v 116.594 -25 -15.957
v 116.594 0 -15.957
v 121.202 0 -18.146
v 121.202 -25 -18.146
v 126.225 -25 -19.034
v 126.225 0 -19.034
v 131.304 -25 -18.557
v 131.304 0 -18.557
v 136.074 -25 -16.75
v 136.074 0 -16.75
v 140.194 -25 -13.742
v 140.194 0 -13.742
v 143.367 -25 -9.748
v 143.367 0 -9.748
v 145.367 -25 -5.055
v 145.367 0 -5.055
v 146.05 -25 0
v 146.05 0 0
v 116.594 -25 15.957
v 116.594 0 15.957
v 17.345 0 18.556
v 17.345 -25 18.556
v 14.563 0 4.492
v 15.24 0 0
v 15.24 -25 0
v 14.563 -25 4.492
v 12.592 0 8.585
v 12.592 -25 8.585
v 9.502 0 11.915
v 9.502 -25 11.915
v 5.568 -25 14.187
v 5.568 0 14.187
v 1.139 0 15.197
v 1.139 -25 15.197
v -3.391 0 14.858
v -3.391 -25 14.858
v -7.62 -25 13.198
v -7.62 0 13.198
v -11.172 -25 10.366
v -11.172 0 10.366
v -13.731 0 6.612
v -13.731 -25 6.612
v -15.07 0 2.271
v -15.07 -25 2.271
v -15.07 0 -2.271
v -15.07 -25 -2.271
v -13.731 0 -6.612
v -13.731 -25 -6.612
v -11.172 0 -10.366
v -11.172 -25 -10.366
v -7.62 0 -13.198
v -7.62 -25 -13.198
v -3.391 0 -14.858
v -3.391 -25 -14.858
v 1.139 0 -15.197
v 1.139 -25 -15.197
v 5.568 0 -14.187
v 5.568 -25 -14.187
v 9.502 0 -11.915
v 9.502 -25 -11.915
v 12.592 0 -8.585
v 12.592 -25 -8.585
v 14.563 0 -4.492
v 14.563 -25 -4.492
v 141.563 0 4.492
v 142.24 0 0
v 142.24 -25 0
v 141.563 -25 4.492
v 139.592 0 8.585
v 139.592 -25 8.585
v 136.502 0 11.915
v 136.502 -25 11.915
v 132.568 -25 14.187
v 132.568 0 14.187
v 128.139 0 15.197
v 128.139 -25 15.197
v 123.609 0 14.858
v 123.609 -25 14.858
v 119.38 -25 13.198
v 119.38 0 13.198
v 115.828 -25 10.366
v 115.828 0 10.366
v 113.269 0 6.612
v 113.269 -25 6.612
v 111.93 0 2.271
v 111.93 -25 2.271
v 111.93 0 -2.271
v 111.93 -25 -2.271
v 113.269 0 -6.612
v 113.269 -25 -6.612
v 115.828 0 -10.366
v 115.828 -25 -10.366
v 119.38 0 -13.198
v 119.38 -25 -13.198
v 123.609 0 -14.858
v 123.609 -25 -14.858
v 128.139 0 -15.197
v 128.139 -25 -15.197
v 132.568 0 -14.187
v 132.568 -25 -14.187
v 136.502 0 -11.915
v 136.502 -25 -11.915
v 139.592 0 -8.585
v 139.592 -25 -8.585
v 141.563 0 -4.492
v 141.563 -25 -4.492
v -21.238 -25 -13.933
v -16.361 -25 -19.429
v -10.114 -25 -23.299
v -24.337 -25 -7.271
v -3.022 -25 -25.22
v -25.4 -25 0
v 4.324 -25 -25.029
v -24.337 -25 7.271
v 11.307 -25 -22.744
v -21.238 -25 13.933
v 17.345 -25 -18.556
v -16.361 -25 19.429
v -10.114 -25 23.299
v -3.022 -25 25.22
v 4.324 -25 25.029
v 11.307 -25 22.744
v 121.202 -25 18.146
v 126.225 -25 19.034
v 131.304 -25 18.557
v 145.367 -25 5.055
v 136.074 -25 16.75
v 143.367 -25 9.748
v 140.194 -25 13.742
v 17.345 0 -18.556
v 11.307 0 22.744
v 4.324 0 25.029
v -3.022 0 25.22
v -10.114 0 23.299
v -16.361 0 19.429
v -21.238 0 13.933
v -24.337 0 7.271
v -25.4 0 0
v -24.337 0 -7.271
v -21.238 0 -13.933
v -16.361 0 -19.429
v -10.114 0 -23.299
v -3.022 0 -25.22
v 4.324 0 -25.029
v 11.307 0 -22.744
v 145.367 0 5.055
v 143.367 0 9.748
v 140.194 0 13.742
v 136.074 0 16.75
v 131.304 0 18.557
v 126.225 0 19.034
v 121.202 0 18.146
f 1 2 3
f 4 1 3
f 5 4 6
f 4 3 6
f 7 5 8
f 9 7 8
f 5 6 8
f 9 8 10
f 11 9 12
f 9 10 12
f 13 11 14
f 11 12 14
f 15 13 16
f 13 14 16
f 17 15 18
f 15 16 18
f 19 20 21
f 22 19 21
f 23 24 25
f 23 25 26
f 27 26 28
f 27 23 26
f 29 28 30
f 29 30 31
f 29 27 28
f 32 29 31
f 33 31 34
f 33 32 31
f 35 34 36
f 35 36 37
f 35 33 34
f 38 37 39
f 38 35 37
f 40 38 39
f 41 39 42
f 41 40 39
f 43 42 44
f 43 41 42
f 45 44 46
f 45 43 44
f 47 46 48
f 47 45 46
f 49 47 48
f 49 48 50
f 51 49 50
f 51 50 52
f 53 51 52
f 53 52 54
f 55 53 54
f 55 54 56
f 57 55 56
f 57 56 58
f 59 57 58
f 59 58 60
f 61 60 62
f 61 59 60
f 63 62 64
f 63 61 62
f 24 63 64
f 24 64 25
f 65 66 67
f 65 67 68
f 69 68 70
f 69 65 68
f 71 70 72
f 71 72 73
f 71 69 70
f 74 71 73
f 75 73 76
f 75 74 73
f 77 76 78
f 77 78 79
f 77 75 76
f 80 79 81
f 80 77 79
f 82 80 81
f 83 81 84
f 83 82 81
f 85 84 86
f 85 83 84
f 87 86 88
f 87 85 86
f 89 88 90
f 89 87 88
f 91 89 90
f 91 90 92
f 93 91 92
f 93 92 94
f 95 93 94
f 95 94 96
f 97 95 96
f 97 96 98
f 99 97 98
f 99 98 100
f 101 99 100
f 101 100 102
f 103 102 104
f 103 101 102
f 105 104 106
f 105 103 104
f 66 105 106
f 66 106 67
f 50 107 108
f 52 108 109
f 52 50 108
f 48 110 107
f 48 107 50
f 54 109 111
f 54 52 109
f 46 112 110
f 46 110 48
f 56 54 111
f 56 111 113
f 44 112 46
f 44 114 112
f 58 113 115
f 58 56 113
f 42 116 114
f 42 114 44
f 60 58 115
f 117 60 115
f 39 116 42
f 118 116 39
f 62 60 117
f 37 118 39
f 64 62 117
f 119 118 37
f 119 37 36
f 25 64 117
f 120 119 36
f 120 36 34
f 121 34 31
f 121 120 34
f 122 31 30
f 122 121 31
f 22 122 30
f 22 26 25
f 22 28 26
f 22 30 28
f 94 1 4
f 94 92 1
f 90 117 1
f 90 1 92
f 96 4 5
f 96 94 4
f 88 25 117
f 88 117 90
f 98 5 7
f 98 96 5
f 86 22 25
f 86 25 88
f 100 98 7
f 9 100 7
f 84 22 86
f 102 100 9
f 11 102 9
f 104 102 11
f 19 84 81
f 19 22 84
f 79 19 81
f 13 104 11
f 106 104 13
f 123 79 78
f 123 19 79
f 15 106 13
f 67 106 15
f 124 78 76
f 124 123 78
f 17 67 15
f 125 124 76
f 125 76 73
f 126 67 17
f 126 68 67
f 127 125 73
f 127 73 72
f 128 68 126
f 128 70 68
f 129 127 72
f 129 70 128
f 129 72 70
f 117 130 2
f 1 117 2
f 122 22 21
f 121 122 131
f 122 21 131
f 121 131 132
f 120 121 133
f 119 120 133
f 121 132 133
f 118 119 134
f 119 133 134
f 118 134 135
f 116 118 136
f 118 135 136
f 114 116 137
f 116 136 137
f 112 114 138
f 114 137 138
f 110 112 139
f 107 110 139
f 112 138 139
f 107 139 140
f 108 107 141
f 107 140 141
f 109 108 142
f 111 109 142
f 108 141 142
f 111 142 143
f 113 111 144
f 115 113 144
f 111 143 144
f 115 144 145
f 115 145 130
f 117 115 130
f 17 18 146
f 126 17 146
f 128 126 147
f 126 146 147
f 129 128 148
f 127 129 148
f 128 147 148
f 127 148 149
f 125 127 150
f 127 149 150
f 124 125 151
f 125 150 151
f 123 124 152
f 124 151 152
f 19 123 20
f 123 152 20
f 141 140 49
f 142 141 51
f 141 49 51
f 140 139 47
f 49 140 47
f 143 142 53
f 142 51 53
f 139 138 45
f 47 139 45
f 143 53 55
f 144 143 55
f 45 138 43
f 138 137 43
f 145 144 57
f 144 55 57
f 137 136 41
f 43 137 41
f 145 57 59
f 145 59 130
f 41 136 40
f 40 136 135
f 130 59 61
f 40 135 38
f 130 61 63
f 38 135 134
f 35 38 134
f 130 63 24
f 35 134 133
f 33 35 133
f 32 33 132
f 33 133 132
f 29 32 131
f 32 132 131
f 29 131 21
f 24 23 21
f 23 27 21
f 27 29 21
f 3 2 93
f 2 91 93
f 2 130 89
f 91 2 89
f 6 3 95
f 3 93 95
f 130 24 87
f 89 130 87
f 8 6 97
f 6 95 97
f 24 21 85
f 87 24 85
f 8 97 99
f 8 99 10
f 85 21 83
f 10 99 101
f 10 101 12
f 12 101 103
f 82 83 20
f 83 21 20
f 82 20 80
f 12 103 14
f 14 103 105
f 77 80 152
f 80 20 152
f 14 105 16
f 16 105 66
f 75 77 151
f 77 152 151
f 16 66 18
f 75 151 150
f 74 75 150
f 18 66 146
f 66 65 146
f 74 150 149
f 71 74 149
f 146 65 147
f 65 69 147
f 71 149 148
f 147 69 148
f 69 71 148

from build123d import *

# Parameters (mm, degrees)
F0_R     = 15.24
F1_DEPTH = 25


# Not quite as in the source:
# - a feature names something its author has since deleted; it is built from what else it names


with BuildPart() as f1:
    # F0 (on Front) → F1 (new body)
    with BuildSketch(Plane.XZ):
        with BuildLine():
            ThreePointArc((17.3446724068, 18.5559246361), (23.2992991218, 10.1144777637), (25.4, 0))
            ThreePointArc((25.4, 0), (23.2992991218, -10.1144777637), (17.3446724068, -18.5559246361))
            Line((17.3446724068, -18.5559246361), (116.5943626679, -15.9569800311))
            ThreePointArc((116.5943626679, -15.9569800311), (107.95, 0), (116.5943626679, 15.9569800311))
            Line((116.5943626679, 15.9569800311), (17.3446724068, 18.5559246361))
        make_face()
        with BuildLine():
            ThreePointArc((17.3446724068, -18.5559246361), (23.2992991218, -10.1144777637), (25.4, 0))
            ThreePointArc((25.4, 0), (23.2992991218, 10.1144777637), (17.3446724068, 18.5559246361))
            ThreePointArc((17.3446724068, 18.5559246361), (-25.4, 0), (17.3446724068, -18.5559246361))
        make_face()
        Circle(F0_R, mode=Mode.SUBTRACT)
        with BuildLine():
            ThreePointArc((146.05, 0), (136.0740043207, 16.7500730025), (116.5943626679, 15.9569800311))
            ThreePointArc((116.5943626679, 15.9569800311), (107.95, 0), (116.5943626679, -15.9569800311))
            ThreePointArc((116.5943626679, -15.9569800311), (136.0740043207, -16.7500730025), (146.05, 0))
        make_face()
        with Locations((127, 0)):
            Circle(F0_R, mode=Mode.SUBTRACT)
    extrude(amount=F1_DEPTH)


solid = f1.part
